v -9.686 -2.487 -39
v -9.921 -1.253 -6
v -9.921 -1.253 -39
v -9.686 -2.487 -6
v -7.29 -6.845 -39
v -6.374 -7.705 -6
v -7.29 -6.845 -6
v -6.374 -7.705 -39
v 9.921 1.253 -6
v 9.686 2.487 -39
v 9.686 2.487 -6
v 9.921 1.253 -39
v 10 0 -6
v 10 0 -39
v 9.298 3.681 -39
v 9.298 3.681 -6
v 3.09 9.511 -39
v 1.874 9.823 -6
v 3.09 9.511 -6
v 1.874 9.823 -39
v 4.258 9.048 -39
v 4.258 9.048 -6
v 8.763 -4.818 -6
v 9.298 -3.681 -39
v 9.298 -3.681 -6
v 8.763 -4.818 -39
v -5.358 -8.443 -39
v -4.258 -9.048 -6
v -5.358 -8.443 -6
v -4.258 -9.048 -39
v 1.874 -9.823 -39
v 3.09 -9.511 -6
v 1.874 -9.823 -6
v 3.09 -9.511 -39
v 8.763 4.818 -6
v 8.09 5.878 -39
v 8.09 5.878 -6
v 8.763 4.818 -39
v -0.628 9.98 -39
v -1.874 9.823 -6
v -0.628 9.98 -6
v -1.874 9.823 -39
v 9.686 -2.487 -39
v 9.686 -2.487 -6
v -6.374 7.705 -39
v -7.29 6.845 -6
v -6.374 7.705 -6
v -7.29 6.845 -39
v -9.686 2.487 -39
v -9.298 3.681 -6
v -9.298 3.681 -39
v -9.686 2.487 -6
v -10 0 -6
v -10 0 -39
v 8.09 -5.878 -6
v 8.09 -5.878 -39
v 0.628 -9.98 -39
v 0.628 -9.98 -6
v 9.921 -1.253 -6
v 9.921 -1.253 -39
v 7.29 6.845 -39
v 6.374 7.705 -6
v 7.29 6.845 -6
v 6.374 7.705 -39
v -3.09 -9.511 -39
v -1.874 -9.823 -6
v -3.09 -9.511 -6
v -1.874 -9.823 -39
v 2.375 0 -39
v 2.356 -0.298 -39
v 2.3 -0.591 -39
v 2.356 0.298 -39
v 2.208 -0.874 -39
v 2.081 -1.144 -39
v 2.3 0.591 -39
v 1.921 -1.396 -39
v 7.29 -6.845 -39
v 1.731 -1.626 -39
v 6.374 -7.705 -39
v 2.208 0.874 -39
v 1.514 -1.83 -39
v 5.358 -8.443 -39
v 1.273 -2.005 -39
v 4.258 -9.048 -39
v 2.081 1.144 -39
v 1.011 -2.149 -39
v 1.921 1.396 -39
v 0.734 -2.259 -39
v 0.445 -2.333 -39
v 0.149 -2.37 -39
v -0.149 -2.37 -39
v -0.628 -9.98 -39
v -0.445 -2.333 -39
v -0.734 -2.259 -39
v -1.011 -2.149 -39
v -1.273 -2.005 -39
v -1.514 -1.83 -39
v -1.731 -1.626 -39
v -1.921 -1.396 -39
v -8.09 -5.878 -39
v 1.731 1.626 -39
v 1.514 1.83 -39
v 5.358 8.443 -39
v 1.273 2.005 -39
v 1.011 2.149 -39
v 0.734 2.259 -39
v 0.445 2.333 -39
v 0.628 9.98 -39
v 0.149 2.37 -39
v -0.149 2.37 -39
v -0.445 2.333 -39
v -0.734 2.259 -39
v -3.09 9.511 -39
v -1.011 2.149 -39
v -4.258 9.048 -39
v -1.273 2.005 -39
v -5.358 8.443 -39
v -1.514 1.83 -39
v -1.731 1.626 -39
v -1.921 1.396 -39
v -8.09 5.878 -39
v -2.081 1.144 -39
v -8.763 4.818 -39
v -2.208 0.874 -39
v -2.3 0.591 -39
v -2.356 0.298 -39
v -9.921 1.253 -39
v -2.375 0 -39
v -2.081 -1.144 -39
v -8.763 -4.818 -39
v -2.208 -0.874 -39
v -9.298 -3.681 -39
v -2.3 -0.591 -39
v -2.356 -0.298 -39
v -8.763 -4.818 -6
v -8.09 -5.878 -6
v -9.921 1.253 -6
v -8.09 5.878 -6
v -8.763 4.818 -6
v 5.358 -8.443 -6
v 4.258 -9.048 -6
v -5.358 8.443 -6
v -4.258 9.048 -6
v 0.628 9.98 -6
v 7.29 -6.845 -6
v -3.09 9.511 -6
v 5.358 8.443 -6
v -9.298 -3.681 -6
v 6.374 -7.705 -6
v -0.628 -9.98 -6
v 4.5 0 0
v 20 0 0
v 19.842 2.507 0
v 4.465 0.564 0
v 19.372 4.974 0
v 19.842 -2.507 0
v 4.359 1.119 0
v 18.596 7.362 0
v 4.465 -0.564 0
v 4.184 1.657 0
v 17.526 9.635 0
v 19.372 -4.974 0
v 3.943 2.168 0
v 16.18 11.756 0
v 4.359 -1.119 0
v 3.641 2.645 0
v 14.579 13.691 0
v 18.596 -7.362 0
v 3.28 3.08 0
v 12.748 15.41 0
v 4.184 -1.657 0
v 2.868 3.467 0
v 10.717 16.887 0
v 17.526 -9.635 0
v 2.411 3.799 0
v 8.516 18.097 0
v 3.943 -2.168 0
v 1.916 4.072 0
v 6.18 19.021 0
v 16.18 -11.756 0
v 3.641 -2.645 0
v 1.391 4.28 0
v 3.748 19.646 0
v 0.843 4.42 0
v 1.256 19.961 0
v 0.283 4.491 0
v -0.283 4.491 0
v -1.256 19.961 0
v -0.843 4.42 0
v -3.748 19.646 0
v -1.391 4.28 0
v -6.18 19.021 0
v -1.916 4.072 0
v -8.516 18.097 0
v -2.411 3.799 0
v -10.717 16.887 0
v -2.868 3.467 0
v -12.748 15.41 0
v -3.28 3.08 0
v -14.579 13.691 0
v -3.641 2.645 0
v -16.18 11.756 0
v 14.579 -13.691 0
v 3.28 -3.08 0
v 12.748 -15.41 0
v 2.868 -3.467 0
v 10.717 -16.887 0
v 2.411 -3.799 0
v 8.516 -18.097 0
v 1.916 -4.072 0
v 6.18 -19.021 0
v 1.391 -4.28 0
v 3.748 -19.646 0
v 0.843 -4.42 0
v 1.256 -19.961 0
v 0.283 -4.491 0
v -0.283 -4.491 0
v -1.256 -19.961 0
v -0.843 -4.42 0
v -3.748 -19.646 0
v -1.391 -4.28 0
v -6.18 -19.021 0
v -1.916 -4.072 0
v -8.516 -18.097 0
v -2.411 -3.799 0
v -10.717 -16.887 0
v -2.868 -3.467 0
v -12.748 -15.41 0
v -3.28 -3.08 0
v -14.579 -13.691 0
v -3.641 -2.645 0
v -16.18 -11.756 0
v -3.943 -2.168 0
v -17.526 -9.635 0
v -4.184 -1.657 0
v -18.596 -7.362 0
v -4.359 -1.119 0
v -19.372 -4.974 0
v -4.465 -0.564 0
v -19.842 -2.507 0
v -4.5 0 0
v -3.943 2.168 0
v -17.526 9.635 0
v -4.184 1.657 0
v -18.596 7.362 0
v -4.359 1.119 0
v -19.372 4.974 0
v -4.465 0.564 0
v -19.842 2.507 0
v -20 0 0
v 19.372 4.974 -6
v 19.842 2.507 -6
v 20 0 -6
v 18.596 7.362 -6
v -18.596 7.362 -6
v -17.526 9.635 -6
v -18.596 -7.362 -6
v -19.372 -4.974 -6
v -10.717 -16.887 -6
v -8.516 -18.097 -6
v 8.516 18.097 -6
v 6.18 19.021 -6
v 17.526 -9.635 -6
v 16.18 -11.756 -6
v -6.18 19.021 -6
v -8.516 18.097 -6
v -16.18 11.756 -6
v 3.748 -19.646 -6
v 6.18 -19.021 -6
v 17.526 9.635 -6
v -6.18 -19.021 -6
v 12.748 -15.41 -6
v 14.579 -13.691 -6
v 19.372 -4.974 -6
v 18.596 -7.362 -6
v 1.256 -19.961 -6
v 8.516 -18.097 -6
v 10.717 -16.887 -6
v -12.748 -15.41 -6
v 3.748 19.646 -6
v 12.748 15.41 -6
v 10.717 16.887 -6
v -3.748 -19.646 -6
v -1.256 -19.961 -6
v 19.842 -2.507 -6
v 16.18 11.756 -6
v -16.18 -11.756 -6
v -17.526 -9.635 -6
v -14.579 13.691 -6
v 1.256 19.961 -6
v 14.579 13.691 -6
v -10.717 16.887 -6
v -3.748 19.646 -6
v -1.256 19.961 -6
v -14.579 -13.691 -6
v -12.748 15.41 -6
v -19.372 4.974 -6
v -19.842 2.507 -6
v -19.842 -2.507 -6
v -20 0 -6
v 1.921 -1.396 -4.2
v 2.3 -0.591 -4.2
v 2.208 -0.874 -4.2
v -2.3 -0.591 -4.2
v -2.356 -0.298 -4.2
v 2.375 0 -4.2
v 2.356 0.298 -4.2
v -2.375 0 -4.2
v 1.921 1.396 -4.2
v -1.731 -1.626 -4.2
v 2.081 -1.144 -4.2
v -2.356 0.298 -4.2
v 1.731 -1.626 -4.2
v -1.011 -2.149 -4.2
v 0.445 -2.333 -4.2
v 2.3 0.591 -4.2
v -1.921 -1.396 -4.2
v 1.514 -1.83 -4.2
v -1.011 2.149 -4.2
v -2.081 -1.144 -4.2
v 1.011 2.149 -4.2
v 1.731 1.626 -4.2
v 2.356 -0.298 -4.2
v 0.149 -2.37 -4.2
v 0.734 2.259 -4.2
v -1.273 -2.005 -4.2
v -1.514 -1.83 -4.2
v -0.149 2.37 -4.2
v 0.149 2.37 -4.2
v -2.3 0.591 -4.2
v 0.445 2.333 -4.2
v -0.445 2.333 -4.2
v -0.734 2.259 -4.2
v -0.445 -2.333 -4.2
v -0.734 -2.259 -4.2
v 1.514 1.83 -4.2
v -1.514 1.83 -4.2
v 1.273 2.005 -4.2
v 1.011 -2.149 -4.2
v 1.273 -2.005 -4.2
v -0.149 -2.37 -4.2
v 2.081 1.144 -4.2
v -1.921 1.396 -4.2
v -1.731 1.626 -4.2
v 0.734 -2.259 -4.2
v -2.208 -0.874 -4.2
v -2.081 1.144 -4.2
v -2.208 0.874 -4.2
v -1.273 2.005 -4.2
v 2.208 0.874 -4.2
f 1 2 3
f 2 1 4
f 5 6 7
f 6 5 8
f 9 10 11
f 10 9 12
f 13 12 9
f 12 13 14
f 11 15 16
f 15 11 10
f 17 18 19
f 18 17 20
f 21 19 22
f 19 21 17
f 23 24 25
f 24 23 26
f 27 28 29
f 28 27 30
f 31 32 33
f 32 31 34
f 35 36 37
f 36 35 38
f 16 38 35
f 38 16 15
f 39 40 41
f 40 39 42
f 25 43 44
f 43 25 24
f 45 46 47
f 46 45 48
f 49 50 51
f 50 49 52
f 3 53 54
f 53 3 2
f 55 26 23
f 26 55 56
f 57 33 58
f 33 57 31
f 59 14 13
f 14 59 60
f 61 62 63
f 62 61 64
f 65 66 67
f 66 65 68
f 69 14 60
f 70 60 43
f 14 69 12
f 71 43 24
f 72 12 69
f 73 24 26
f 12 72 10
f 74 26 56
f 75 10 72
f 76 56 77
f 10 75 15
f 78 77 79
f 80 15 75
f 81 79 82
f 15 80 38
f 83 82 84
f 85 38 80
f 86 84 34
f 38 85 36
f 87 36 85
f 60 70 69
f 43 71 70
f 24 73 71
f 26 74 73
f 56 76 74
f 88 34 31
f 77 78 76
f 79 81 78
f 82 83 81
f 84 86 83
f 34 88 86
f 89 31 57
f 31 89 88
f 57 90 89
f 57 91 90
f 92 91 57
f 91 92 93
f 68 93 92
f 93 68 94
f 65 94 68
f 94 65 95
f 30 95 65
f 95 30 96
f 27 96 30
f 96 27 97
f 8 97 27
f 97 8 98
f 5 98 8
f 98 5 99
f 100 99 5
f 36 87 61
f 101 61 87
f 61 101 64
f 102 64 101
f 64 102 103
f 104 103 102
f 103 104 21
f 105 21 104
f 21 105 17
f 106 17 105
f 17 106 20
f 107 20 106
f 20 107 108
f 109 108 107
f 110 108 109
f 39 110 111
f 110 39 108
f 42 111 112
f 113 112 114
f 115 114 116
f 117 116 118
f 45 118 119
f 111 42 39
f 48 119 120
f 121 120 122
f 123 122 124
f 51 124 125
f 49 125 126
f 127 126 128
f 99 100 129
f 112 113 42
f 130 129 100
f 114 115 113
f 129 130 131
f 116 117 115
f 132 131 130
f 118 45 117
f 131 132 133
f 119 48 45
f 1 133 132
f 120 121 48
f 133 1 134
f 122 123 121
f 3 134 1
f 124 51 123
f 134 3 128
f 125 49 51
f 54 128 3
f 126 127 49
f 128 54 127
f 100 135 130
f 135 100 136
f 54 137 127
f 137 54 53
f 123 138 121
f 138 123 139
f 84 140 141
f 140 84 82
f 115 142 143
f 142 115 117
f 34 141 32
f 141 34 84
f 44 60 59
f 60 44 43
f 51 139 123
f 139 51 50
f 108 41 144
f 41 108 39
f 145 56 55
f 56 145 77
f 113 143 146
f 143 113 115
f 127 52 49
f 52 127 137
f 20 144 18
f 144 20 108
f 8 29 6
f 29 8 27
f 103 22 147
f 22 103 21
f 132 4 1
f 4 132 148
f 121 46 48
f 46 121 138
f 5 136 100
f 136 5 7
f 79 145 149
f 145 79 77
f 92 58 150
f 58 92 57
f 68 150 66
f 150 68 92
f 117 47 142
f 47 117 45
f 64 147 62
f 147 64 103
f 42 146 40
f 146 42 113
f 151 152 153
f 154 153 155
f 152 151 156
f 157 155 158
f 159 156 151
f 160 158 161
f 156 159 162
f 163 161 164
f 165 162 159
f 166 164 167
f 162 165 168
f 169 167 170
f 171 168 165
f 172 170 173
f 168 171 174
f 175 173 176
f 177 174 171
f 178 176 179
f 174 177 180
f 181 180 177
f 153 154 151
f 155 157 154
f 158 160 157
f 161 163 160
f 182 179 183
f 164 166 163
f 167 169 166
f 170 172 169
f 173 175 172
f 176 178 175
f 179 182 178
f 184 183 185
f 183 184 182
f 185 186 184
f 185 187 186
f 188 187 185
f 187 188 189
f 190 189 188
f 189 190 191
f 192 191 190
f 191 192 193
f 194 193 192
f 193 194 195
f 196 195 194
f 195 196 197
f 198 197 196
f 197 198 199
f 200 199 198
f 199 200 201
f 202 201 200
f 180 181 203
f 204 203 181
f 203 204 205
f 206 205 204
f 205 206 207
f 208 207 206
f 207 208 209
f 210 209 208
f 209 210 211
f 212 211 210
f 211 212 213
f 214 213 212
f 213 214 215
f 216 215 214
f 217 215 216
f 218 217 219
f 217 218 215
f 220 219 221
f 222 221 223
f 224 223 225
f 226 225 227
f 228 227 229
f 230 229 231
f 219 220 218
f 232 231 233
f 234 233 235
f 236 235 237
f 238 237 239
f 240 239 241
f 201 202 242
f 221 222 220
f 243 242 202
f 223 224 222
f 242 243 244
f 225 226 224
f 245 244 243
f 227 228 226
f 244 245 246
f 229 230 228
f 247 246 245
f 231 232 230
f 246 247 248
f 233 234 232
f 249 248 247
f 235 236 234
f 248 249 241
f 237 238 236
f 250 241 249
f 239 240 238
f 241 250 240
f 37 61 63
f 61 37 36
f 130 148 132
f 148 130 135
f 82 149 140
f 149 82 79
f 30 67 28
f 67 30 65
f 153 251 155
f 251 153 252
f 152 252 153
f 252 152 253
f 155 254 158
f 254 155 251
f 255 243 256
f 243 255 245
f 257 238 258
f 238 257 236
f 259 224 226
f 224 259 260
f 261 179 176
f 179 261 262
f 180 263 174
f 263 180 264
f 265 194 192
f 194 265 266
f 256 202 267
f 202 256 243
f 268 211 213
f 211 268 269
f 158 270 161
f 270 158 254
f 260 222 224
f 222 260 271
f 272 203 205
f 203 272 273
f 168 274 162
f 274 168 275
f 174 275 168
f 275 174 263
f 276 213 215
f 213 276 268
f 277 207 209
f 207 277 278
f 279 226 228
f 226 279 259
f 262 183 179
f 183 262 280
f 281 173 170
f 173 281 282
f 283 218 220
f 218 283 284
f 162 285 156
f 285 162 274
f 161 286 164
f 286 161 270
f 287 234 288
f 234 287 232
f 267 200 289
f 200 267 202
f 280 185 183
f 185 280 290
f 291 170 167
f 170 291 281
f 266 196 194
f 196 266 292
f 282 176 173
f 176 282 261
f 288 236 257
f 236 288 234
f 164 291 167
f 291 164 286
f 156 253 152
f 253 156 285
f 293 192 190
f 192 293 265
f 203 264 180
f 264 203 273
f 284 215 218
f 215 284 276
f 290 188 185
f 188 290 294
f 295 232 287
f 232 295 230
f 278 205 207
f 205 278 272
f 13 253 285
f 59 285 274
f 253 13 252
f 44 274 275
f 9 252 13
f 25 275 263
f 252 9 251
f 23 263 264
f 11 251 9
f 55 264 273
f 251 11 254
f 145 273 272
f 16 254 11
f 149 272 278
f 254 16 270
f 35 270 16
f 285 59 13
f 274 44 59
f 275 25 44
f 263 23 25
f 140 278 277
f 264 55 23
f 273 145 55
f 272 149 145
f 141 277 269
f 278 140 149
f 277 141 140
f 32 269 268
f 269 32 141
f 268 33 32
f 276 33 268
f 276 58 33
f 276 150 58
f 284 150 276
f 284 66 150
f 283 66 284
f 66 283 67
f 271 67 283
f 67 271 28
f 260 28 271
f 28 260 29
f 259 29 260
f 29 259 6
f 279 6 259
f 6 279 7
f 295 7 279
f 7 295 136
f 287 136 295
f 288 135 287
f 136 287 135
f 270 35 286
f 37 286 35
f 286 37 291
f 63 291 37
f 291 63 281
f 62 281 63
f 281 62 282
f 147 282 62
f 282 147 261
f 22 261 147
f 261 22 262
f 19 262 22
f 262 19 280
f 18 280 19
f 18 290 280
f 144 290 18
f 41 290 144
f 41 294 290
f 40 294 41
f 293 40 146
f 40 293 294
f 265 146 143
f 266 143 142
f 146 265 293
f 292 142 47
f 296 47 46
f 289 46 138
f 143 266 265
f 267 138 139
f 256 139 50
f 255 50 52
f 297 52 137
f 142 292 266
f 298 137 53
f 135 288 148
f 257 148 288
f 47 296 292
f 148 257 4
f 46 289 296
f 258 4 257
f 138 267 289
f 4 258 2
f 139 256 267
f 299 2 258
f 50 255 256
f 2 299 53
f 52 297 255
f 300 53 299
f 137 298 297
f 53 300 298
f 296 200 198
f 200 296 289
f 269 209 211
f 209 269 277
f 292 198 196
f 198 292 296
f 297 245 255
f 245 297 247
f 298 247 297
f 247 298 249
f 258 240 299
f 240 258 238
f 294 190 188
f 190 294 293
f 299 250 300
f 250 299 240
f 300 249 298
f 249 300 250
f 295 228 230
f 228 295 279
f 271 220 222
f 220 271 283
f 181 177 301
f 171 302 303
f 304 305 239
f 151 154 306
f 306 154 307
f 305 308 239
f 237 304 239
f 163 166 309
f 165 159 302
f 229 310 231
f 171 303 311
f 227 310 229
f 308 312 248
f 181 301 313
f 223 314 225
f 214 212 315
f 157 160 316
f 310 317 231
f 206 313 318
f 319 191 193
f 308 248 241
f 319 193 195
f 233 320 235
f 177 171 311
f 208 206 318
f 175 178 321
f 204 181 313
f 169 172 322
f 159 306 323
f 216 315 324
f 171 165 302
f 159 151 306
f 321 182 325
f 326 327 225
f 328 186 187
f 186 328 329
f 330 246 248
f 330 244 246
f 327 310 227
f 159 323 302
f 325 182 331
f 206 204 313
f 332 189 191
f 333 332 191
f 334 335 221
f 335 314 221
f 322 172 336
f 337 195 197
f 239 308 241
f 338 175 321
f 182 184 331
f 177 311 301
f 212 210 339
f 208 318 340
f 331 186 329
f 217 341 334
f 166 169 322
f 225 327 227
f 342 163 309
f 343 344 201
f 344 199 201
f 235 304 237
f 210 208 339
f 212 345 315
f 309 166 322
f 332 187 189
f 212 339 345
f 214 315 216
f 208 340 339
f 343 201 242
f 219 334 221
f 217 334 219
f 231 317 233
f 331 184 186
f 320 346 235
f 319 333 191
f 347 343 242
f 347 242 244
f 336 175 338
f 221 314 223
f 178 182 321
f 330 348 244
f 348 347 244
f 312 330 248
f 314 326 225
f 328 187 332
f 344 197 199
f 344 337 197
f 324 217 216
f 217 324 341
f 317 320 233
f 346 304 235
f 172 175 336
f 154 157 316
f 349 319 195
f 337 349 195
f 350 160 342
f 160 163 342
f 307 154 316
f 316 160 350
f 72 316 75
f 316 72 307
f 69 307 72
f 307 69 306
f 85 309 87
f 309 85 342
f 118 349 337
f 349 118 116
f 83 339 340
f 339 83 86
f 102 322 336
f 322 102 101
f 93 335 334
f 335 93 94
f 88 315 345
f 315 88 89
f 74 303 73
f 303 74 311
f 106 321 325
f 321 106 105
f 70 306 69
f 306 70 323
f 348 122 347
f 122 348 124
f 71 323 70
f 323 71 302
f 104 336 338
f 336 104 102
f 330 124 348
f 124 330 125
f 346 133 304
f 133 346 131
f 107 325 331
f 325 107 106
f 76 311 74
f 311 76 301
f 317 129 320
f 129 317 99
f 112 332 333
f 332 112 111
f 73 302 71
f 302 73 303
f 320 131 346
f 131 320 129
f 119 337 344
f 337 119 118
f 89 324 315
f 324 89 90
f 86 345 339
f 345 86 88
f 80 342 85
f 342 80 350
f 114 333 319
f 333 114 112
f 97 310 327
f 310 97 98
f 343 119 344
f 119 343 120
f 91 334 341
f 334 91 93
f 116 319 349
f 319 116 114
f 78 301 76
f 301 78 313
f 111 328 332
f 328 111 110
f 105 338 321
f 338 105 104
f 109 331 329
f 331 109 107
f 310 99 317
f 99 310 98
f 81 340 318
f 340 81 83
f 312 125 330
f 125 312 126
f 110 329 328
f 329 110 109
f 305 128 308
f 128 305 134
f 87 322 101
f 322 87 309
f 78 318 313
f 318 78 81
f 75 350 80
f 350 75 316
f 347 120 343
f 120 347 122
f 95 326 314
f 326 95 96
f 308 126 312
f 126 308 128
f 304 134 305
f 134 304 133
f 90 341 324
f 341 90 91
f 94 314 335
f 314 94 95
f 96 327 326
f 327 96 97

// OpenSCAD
$fn = 50;


difference() {
	union() {
		translate(v = [0, 0, -39.0000000000]) {
			cylinder(h = 39, r = 10.0000000000);
		}
		translate(v = [0, 0, -6.0000000000]) {
			cylinder(h = 6, r = 20.0000000000);
		}
	}
	union() {
		translate(v = [0, 0, 0]) {
			rotate(a = [0, 0, 0]) {
				difference() {
					union() {
						#translate(v = [0, 0, -39.0000000000]) {
							cylinder(h = 39, r = 2.2500000000);
						}
						#translate(v = [0, 0, -4.2000000000]) {
							cylinder(h = 4.2000000000, r = 10.0000000000, r1 = 2.3750000000, r2 = 4.5000000000);
						}
						#translate(v = [0, 0, -39.0000000000]) {
							cylinder(h = 39, r = 2.3750000000);
						}
						#translate(v = [0, 0, -39.0000000000]) {
							cylinder(h = 39, r = 2.2500000000);
						}
					}
					union();
				}
			}
		}
	}
}
